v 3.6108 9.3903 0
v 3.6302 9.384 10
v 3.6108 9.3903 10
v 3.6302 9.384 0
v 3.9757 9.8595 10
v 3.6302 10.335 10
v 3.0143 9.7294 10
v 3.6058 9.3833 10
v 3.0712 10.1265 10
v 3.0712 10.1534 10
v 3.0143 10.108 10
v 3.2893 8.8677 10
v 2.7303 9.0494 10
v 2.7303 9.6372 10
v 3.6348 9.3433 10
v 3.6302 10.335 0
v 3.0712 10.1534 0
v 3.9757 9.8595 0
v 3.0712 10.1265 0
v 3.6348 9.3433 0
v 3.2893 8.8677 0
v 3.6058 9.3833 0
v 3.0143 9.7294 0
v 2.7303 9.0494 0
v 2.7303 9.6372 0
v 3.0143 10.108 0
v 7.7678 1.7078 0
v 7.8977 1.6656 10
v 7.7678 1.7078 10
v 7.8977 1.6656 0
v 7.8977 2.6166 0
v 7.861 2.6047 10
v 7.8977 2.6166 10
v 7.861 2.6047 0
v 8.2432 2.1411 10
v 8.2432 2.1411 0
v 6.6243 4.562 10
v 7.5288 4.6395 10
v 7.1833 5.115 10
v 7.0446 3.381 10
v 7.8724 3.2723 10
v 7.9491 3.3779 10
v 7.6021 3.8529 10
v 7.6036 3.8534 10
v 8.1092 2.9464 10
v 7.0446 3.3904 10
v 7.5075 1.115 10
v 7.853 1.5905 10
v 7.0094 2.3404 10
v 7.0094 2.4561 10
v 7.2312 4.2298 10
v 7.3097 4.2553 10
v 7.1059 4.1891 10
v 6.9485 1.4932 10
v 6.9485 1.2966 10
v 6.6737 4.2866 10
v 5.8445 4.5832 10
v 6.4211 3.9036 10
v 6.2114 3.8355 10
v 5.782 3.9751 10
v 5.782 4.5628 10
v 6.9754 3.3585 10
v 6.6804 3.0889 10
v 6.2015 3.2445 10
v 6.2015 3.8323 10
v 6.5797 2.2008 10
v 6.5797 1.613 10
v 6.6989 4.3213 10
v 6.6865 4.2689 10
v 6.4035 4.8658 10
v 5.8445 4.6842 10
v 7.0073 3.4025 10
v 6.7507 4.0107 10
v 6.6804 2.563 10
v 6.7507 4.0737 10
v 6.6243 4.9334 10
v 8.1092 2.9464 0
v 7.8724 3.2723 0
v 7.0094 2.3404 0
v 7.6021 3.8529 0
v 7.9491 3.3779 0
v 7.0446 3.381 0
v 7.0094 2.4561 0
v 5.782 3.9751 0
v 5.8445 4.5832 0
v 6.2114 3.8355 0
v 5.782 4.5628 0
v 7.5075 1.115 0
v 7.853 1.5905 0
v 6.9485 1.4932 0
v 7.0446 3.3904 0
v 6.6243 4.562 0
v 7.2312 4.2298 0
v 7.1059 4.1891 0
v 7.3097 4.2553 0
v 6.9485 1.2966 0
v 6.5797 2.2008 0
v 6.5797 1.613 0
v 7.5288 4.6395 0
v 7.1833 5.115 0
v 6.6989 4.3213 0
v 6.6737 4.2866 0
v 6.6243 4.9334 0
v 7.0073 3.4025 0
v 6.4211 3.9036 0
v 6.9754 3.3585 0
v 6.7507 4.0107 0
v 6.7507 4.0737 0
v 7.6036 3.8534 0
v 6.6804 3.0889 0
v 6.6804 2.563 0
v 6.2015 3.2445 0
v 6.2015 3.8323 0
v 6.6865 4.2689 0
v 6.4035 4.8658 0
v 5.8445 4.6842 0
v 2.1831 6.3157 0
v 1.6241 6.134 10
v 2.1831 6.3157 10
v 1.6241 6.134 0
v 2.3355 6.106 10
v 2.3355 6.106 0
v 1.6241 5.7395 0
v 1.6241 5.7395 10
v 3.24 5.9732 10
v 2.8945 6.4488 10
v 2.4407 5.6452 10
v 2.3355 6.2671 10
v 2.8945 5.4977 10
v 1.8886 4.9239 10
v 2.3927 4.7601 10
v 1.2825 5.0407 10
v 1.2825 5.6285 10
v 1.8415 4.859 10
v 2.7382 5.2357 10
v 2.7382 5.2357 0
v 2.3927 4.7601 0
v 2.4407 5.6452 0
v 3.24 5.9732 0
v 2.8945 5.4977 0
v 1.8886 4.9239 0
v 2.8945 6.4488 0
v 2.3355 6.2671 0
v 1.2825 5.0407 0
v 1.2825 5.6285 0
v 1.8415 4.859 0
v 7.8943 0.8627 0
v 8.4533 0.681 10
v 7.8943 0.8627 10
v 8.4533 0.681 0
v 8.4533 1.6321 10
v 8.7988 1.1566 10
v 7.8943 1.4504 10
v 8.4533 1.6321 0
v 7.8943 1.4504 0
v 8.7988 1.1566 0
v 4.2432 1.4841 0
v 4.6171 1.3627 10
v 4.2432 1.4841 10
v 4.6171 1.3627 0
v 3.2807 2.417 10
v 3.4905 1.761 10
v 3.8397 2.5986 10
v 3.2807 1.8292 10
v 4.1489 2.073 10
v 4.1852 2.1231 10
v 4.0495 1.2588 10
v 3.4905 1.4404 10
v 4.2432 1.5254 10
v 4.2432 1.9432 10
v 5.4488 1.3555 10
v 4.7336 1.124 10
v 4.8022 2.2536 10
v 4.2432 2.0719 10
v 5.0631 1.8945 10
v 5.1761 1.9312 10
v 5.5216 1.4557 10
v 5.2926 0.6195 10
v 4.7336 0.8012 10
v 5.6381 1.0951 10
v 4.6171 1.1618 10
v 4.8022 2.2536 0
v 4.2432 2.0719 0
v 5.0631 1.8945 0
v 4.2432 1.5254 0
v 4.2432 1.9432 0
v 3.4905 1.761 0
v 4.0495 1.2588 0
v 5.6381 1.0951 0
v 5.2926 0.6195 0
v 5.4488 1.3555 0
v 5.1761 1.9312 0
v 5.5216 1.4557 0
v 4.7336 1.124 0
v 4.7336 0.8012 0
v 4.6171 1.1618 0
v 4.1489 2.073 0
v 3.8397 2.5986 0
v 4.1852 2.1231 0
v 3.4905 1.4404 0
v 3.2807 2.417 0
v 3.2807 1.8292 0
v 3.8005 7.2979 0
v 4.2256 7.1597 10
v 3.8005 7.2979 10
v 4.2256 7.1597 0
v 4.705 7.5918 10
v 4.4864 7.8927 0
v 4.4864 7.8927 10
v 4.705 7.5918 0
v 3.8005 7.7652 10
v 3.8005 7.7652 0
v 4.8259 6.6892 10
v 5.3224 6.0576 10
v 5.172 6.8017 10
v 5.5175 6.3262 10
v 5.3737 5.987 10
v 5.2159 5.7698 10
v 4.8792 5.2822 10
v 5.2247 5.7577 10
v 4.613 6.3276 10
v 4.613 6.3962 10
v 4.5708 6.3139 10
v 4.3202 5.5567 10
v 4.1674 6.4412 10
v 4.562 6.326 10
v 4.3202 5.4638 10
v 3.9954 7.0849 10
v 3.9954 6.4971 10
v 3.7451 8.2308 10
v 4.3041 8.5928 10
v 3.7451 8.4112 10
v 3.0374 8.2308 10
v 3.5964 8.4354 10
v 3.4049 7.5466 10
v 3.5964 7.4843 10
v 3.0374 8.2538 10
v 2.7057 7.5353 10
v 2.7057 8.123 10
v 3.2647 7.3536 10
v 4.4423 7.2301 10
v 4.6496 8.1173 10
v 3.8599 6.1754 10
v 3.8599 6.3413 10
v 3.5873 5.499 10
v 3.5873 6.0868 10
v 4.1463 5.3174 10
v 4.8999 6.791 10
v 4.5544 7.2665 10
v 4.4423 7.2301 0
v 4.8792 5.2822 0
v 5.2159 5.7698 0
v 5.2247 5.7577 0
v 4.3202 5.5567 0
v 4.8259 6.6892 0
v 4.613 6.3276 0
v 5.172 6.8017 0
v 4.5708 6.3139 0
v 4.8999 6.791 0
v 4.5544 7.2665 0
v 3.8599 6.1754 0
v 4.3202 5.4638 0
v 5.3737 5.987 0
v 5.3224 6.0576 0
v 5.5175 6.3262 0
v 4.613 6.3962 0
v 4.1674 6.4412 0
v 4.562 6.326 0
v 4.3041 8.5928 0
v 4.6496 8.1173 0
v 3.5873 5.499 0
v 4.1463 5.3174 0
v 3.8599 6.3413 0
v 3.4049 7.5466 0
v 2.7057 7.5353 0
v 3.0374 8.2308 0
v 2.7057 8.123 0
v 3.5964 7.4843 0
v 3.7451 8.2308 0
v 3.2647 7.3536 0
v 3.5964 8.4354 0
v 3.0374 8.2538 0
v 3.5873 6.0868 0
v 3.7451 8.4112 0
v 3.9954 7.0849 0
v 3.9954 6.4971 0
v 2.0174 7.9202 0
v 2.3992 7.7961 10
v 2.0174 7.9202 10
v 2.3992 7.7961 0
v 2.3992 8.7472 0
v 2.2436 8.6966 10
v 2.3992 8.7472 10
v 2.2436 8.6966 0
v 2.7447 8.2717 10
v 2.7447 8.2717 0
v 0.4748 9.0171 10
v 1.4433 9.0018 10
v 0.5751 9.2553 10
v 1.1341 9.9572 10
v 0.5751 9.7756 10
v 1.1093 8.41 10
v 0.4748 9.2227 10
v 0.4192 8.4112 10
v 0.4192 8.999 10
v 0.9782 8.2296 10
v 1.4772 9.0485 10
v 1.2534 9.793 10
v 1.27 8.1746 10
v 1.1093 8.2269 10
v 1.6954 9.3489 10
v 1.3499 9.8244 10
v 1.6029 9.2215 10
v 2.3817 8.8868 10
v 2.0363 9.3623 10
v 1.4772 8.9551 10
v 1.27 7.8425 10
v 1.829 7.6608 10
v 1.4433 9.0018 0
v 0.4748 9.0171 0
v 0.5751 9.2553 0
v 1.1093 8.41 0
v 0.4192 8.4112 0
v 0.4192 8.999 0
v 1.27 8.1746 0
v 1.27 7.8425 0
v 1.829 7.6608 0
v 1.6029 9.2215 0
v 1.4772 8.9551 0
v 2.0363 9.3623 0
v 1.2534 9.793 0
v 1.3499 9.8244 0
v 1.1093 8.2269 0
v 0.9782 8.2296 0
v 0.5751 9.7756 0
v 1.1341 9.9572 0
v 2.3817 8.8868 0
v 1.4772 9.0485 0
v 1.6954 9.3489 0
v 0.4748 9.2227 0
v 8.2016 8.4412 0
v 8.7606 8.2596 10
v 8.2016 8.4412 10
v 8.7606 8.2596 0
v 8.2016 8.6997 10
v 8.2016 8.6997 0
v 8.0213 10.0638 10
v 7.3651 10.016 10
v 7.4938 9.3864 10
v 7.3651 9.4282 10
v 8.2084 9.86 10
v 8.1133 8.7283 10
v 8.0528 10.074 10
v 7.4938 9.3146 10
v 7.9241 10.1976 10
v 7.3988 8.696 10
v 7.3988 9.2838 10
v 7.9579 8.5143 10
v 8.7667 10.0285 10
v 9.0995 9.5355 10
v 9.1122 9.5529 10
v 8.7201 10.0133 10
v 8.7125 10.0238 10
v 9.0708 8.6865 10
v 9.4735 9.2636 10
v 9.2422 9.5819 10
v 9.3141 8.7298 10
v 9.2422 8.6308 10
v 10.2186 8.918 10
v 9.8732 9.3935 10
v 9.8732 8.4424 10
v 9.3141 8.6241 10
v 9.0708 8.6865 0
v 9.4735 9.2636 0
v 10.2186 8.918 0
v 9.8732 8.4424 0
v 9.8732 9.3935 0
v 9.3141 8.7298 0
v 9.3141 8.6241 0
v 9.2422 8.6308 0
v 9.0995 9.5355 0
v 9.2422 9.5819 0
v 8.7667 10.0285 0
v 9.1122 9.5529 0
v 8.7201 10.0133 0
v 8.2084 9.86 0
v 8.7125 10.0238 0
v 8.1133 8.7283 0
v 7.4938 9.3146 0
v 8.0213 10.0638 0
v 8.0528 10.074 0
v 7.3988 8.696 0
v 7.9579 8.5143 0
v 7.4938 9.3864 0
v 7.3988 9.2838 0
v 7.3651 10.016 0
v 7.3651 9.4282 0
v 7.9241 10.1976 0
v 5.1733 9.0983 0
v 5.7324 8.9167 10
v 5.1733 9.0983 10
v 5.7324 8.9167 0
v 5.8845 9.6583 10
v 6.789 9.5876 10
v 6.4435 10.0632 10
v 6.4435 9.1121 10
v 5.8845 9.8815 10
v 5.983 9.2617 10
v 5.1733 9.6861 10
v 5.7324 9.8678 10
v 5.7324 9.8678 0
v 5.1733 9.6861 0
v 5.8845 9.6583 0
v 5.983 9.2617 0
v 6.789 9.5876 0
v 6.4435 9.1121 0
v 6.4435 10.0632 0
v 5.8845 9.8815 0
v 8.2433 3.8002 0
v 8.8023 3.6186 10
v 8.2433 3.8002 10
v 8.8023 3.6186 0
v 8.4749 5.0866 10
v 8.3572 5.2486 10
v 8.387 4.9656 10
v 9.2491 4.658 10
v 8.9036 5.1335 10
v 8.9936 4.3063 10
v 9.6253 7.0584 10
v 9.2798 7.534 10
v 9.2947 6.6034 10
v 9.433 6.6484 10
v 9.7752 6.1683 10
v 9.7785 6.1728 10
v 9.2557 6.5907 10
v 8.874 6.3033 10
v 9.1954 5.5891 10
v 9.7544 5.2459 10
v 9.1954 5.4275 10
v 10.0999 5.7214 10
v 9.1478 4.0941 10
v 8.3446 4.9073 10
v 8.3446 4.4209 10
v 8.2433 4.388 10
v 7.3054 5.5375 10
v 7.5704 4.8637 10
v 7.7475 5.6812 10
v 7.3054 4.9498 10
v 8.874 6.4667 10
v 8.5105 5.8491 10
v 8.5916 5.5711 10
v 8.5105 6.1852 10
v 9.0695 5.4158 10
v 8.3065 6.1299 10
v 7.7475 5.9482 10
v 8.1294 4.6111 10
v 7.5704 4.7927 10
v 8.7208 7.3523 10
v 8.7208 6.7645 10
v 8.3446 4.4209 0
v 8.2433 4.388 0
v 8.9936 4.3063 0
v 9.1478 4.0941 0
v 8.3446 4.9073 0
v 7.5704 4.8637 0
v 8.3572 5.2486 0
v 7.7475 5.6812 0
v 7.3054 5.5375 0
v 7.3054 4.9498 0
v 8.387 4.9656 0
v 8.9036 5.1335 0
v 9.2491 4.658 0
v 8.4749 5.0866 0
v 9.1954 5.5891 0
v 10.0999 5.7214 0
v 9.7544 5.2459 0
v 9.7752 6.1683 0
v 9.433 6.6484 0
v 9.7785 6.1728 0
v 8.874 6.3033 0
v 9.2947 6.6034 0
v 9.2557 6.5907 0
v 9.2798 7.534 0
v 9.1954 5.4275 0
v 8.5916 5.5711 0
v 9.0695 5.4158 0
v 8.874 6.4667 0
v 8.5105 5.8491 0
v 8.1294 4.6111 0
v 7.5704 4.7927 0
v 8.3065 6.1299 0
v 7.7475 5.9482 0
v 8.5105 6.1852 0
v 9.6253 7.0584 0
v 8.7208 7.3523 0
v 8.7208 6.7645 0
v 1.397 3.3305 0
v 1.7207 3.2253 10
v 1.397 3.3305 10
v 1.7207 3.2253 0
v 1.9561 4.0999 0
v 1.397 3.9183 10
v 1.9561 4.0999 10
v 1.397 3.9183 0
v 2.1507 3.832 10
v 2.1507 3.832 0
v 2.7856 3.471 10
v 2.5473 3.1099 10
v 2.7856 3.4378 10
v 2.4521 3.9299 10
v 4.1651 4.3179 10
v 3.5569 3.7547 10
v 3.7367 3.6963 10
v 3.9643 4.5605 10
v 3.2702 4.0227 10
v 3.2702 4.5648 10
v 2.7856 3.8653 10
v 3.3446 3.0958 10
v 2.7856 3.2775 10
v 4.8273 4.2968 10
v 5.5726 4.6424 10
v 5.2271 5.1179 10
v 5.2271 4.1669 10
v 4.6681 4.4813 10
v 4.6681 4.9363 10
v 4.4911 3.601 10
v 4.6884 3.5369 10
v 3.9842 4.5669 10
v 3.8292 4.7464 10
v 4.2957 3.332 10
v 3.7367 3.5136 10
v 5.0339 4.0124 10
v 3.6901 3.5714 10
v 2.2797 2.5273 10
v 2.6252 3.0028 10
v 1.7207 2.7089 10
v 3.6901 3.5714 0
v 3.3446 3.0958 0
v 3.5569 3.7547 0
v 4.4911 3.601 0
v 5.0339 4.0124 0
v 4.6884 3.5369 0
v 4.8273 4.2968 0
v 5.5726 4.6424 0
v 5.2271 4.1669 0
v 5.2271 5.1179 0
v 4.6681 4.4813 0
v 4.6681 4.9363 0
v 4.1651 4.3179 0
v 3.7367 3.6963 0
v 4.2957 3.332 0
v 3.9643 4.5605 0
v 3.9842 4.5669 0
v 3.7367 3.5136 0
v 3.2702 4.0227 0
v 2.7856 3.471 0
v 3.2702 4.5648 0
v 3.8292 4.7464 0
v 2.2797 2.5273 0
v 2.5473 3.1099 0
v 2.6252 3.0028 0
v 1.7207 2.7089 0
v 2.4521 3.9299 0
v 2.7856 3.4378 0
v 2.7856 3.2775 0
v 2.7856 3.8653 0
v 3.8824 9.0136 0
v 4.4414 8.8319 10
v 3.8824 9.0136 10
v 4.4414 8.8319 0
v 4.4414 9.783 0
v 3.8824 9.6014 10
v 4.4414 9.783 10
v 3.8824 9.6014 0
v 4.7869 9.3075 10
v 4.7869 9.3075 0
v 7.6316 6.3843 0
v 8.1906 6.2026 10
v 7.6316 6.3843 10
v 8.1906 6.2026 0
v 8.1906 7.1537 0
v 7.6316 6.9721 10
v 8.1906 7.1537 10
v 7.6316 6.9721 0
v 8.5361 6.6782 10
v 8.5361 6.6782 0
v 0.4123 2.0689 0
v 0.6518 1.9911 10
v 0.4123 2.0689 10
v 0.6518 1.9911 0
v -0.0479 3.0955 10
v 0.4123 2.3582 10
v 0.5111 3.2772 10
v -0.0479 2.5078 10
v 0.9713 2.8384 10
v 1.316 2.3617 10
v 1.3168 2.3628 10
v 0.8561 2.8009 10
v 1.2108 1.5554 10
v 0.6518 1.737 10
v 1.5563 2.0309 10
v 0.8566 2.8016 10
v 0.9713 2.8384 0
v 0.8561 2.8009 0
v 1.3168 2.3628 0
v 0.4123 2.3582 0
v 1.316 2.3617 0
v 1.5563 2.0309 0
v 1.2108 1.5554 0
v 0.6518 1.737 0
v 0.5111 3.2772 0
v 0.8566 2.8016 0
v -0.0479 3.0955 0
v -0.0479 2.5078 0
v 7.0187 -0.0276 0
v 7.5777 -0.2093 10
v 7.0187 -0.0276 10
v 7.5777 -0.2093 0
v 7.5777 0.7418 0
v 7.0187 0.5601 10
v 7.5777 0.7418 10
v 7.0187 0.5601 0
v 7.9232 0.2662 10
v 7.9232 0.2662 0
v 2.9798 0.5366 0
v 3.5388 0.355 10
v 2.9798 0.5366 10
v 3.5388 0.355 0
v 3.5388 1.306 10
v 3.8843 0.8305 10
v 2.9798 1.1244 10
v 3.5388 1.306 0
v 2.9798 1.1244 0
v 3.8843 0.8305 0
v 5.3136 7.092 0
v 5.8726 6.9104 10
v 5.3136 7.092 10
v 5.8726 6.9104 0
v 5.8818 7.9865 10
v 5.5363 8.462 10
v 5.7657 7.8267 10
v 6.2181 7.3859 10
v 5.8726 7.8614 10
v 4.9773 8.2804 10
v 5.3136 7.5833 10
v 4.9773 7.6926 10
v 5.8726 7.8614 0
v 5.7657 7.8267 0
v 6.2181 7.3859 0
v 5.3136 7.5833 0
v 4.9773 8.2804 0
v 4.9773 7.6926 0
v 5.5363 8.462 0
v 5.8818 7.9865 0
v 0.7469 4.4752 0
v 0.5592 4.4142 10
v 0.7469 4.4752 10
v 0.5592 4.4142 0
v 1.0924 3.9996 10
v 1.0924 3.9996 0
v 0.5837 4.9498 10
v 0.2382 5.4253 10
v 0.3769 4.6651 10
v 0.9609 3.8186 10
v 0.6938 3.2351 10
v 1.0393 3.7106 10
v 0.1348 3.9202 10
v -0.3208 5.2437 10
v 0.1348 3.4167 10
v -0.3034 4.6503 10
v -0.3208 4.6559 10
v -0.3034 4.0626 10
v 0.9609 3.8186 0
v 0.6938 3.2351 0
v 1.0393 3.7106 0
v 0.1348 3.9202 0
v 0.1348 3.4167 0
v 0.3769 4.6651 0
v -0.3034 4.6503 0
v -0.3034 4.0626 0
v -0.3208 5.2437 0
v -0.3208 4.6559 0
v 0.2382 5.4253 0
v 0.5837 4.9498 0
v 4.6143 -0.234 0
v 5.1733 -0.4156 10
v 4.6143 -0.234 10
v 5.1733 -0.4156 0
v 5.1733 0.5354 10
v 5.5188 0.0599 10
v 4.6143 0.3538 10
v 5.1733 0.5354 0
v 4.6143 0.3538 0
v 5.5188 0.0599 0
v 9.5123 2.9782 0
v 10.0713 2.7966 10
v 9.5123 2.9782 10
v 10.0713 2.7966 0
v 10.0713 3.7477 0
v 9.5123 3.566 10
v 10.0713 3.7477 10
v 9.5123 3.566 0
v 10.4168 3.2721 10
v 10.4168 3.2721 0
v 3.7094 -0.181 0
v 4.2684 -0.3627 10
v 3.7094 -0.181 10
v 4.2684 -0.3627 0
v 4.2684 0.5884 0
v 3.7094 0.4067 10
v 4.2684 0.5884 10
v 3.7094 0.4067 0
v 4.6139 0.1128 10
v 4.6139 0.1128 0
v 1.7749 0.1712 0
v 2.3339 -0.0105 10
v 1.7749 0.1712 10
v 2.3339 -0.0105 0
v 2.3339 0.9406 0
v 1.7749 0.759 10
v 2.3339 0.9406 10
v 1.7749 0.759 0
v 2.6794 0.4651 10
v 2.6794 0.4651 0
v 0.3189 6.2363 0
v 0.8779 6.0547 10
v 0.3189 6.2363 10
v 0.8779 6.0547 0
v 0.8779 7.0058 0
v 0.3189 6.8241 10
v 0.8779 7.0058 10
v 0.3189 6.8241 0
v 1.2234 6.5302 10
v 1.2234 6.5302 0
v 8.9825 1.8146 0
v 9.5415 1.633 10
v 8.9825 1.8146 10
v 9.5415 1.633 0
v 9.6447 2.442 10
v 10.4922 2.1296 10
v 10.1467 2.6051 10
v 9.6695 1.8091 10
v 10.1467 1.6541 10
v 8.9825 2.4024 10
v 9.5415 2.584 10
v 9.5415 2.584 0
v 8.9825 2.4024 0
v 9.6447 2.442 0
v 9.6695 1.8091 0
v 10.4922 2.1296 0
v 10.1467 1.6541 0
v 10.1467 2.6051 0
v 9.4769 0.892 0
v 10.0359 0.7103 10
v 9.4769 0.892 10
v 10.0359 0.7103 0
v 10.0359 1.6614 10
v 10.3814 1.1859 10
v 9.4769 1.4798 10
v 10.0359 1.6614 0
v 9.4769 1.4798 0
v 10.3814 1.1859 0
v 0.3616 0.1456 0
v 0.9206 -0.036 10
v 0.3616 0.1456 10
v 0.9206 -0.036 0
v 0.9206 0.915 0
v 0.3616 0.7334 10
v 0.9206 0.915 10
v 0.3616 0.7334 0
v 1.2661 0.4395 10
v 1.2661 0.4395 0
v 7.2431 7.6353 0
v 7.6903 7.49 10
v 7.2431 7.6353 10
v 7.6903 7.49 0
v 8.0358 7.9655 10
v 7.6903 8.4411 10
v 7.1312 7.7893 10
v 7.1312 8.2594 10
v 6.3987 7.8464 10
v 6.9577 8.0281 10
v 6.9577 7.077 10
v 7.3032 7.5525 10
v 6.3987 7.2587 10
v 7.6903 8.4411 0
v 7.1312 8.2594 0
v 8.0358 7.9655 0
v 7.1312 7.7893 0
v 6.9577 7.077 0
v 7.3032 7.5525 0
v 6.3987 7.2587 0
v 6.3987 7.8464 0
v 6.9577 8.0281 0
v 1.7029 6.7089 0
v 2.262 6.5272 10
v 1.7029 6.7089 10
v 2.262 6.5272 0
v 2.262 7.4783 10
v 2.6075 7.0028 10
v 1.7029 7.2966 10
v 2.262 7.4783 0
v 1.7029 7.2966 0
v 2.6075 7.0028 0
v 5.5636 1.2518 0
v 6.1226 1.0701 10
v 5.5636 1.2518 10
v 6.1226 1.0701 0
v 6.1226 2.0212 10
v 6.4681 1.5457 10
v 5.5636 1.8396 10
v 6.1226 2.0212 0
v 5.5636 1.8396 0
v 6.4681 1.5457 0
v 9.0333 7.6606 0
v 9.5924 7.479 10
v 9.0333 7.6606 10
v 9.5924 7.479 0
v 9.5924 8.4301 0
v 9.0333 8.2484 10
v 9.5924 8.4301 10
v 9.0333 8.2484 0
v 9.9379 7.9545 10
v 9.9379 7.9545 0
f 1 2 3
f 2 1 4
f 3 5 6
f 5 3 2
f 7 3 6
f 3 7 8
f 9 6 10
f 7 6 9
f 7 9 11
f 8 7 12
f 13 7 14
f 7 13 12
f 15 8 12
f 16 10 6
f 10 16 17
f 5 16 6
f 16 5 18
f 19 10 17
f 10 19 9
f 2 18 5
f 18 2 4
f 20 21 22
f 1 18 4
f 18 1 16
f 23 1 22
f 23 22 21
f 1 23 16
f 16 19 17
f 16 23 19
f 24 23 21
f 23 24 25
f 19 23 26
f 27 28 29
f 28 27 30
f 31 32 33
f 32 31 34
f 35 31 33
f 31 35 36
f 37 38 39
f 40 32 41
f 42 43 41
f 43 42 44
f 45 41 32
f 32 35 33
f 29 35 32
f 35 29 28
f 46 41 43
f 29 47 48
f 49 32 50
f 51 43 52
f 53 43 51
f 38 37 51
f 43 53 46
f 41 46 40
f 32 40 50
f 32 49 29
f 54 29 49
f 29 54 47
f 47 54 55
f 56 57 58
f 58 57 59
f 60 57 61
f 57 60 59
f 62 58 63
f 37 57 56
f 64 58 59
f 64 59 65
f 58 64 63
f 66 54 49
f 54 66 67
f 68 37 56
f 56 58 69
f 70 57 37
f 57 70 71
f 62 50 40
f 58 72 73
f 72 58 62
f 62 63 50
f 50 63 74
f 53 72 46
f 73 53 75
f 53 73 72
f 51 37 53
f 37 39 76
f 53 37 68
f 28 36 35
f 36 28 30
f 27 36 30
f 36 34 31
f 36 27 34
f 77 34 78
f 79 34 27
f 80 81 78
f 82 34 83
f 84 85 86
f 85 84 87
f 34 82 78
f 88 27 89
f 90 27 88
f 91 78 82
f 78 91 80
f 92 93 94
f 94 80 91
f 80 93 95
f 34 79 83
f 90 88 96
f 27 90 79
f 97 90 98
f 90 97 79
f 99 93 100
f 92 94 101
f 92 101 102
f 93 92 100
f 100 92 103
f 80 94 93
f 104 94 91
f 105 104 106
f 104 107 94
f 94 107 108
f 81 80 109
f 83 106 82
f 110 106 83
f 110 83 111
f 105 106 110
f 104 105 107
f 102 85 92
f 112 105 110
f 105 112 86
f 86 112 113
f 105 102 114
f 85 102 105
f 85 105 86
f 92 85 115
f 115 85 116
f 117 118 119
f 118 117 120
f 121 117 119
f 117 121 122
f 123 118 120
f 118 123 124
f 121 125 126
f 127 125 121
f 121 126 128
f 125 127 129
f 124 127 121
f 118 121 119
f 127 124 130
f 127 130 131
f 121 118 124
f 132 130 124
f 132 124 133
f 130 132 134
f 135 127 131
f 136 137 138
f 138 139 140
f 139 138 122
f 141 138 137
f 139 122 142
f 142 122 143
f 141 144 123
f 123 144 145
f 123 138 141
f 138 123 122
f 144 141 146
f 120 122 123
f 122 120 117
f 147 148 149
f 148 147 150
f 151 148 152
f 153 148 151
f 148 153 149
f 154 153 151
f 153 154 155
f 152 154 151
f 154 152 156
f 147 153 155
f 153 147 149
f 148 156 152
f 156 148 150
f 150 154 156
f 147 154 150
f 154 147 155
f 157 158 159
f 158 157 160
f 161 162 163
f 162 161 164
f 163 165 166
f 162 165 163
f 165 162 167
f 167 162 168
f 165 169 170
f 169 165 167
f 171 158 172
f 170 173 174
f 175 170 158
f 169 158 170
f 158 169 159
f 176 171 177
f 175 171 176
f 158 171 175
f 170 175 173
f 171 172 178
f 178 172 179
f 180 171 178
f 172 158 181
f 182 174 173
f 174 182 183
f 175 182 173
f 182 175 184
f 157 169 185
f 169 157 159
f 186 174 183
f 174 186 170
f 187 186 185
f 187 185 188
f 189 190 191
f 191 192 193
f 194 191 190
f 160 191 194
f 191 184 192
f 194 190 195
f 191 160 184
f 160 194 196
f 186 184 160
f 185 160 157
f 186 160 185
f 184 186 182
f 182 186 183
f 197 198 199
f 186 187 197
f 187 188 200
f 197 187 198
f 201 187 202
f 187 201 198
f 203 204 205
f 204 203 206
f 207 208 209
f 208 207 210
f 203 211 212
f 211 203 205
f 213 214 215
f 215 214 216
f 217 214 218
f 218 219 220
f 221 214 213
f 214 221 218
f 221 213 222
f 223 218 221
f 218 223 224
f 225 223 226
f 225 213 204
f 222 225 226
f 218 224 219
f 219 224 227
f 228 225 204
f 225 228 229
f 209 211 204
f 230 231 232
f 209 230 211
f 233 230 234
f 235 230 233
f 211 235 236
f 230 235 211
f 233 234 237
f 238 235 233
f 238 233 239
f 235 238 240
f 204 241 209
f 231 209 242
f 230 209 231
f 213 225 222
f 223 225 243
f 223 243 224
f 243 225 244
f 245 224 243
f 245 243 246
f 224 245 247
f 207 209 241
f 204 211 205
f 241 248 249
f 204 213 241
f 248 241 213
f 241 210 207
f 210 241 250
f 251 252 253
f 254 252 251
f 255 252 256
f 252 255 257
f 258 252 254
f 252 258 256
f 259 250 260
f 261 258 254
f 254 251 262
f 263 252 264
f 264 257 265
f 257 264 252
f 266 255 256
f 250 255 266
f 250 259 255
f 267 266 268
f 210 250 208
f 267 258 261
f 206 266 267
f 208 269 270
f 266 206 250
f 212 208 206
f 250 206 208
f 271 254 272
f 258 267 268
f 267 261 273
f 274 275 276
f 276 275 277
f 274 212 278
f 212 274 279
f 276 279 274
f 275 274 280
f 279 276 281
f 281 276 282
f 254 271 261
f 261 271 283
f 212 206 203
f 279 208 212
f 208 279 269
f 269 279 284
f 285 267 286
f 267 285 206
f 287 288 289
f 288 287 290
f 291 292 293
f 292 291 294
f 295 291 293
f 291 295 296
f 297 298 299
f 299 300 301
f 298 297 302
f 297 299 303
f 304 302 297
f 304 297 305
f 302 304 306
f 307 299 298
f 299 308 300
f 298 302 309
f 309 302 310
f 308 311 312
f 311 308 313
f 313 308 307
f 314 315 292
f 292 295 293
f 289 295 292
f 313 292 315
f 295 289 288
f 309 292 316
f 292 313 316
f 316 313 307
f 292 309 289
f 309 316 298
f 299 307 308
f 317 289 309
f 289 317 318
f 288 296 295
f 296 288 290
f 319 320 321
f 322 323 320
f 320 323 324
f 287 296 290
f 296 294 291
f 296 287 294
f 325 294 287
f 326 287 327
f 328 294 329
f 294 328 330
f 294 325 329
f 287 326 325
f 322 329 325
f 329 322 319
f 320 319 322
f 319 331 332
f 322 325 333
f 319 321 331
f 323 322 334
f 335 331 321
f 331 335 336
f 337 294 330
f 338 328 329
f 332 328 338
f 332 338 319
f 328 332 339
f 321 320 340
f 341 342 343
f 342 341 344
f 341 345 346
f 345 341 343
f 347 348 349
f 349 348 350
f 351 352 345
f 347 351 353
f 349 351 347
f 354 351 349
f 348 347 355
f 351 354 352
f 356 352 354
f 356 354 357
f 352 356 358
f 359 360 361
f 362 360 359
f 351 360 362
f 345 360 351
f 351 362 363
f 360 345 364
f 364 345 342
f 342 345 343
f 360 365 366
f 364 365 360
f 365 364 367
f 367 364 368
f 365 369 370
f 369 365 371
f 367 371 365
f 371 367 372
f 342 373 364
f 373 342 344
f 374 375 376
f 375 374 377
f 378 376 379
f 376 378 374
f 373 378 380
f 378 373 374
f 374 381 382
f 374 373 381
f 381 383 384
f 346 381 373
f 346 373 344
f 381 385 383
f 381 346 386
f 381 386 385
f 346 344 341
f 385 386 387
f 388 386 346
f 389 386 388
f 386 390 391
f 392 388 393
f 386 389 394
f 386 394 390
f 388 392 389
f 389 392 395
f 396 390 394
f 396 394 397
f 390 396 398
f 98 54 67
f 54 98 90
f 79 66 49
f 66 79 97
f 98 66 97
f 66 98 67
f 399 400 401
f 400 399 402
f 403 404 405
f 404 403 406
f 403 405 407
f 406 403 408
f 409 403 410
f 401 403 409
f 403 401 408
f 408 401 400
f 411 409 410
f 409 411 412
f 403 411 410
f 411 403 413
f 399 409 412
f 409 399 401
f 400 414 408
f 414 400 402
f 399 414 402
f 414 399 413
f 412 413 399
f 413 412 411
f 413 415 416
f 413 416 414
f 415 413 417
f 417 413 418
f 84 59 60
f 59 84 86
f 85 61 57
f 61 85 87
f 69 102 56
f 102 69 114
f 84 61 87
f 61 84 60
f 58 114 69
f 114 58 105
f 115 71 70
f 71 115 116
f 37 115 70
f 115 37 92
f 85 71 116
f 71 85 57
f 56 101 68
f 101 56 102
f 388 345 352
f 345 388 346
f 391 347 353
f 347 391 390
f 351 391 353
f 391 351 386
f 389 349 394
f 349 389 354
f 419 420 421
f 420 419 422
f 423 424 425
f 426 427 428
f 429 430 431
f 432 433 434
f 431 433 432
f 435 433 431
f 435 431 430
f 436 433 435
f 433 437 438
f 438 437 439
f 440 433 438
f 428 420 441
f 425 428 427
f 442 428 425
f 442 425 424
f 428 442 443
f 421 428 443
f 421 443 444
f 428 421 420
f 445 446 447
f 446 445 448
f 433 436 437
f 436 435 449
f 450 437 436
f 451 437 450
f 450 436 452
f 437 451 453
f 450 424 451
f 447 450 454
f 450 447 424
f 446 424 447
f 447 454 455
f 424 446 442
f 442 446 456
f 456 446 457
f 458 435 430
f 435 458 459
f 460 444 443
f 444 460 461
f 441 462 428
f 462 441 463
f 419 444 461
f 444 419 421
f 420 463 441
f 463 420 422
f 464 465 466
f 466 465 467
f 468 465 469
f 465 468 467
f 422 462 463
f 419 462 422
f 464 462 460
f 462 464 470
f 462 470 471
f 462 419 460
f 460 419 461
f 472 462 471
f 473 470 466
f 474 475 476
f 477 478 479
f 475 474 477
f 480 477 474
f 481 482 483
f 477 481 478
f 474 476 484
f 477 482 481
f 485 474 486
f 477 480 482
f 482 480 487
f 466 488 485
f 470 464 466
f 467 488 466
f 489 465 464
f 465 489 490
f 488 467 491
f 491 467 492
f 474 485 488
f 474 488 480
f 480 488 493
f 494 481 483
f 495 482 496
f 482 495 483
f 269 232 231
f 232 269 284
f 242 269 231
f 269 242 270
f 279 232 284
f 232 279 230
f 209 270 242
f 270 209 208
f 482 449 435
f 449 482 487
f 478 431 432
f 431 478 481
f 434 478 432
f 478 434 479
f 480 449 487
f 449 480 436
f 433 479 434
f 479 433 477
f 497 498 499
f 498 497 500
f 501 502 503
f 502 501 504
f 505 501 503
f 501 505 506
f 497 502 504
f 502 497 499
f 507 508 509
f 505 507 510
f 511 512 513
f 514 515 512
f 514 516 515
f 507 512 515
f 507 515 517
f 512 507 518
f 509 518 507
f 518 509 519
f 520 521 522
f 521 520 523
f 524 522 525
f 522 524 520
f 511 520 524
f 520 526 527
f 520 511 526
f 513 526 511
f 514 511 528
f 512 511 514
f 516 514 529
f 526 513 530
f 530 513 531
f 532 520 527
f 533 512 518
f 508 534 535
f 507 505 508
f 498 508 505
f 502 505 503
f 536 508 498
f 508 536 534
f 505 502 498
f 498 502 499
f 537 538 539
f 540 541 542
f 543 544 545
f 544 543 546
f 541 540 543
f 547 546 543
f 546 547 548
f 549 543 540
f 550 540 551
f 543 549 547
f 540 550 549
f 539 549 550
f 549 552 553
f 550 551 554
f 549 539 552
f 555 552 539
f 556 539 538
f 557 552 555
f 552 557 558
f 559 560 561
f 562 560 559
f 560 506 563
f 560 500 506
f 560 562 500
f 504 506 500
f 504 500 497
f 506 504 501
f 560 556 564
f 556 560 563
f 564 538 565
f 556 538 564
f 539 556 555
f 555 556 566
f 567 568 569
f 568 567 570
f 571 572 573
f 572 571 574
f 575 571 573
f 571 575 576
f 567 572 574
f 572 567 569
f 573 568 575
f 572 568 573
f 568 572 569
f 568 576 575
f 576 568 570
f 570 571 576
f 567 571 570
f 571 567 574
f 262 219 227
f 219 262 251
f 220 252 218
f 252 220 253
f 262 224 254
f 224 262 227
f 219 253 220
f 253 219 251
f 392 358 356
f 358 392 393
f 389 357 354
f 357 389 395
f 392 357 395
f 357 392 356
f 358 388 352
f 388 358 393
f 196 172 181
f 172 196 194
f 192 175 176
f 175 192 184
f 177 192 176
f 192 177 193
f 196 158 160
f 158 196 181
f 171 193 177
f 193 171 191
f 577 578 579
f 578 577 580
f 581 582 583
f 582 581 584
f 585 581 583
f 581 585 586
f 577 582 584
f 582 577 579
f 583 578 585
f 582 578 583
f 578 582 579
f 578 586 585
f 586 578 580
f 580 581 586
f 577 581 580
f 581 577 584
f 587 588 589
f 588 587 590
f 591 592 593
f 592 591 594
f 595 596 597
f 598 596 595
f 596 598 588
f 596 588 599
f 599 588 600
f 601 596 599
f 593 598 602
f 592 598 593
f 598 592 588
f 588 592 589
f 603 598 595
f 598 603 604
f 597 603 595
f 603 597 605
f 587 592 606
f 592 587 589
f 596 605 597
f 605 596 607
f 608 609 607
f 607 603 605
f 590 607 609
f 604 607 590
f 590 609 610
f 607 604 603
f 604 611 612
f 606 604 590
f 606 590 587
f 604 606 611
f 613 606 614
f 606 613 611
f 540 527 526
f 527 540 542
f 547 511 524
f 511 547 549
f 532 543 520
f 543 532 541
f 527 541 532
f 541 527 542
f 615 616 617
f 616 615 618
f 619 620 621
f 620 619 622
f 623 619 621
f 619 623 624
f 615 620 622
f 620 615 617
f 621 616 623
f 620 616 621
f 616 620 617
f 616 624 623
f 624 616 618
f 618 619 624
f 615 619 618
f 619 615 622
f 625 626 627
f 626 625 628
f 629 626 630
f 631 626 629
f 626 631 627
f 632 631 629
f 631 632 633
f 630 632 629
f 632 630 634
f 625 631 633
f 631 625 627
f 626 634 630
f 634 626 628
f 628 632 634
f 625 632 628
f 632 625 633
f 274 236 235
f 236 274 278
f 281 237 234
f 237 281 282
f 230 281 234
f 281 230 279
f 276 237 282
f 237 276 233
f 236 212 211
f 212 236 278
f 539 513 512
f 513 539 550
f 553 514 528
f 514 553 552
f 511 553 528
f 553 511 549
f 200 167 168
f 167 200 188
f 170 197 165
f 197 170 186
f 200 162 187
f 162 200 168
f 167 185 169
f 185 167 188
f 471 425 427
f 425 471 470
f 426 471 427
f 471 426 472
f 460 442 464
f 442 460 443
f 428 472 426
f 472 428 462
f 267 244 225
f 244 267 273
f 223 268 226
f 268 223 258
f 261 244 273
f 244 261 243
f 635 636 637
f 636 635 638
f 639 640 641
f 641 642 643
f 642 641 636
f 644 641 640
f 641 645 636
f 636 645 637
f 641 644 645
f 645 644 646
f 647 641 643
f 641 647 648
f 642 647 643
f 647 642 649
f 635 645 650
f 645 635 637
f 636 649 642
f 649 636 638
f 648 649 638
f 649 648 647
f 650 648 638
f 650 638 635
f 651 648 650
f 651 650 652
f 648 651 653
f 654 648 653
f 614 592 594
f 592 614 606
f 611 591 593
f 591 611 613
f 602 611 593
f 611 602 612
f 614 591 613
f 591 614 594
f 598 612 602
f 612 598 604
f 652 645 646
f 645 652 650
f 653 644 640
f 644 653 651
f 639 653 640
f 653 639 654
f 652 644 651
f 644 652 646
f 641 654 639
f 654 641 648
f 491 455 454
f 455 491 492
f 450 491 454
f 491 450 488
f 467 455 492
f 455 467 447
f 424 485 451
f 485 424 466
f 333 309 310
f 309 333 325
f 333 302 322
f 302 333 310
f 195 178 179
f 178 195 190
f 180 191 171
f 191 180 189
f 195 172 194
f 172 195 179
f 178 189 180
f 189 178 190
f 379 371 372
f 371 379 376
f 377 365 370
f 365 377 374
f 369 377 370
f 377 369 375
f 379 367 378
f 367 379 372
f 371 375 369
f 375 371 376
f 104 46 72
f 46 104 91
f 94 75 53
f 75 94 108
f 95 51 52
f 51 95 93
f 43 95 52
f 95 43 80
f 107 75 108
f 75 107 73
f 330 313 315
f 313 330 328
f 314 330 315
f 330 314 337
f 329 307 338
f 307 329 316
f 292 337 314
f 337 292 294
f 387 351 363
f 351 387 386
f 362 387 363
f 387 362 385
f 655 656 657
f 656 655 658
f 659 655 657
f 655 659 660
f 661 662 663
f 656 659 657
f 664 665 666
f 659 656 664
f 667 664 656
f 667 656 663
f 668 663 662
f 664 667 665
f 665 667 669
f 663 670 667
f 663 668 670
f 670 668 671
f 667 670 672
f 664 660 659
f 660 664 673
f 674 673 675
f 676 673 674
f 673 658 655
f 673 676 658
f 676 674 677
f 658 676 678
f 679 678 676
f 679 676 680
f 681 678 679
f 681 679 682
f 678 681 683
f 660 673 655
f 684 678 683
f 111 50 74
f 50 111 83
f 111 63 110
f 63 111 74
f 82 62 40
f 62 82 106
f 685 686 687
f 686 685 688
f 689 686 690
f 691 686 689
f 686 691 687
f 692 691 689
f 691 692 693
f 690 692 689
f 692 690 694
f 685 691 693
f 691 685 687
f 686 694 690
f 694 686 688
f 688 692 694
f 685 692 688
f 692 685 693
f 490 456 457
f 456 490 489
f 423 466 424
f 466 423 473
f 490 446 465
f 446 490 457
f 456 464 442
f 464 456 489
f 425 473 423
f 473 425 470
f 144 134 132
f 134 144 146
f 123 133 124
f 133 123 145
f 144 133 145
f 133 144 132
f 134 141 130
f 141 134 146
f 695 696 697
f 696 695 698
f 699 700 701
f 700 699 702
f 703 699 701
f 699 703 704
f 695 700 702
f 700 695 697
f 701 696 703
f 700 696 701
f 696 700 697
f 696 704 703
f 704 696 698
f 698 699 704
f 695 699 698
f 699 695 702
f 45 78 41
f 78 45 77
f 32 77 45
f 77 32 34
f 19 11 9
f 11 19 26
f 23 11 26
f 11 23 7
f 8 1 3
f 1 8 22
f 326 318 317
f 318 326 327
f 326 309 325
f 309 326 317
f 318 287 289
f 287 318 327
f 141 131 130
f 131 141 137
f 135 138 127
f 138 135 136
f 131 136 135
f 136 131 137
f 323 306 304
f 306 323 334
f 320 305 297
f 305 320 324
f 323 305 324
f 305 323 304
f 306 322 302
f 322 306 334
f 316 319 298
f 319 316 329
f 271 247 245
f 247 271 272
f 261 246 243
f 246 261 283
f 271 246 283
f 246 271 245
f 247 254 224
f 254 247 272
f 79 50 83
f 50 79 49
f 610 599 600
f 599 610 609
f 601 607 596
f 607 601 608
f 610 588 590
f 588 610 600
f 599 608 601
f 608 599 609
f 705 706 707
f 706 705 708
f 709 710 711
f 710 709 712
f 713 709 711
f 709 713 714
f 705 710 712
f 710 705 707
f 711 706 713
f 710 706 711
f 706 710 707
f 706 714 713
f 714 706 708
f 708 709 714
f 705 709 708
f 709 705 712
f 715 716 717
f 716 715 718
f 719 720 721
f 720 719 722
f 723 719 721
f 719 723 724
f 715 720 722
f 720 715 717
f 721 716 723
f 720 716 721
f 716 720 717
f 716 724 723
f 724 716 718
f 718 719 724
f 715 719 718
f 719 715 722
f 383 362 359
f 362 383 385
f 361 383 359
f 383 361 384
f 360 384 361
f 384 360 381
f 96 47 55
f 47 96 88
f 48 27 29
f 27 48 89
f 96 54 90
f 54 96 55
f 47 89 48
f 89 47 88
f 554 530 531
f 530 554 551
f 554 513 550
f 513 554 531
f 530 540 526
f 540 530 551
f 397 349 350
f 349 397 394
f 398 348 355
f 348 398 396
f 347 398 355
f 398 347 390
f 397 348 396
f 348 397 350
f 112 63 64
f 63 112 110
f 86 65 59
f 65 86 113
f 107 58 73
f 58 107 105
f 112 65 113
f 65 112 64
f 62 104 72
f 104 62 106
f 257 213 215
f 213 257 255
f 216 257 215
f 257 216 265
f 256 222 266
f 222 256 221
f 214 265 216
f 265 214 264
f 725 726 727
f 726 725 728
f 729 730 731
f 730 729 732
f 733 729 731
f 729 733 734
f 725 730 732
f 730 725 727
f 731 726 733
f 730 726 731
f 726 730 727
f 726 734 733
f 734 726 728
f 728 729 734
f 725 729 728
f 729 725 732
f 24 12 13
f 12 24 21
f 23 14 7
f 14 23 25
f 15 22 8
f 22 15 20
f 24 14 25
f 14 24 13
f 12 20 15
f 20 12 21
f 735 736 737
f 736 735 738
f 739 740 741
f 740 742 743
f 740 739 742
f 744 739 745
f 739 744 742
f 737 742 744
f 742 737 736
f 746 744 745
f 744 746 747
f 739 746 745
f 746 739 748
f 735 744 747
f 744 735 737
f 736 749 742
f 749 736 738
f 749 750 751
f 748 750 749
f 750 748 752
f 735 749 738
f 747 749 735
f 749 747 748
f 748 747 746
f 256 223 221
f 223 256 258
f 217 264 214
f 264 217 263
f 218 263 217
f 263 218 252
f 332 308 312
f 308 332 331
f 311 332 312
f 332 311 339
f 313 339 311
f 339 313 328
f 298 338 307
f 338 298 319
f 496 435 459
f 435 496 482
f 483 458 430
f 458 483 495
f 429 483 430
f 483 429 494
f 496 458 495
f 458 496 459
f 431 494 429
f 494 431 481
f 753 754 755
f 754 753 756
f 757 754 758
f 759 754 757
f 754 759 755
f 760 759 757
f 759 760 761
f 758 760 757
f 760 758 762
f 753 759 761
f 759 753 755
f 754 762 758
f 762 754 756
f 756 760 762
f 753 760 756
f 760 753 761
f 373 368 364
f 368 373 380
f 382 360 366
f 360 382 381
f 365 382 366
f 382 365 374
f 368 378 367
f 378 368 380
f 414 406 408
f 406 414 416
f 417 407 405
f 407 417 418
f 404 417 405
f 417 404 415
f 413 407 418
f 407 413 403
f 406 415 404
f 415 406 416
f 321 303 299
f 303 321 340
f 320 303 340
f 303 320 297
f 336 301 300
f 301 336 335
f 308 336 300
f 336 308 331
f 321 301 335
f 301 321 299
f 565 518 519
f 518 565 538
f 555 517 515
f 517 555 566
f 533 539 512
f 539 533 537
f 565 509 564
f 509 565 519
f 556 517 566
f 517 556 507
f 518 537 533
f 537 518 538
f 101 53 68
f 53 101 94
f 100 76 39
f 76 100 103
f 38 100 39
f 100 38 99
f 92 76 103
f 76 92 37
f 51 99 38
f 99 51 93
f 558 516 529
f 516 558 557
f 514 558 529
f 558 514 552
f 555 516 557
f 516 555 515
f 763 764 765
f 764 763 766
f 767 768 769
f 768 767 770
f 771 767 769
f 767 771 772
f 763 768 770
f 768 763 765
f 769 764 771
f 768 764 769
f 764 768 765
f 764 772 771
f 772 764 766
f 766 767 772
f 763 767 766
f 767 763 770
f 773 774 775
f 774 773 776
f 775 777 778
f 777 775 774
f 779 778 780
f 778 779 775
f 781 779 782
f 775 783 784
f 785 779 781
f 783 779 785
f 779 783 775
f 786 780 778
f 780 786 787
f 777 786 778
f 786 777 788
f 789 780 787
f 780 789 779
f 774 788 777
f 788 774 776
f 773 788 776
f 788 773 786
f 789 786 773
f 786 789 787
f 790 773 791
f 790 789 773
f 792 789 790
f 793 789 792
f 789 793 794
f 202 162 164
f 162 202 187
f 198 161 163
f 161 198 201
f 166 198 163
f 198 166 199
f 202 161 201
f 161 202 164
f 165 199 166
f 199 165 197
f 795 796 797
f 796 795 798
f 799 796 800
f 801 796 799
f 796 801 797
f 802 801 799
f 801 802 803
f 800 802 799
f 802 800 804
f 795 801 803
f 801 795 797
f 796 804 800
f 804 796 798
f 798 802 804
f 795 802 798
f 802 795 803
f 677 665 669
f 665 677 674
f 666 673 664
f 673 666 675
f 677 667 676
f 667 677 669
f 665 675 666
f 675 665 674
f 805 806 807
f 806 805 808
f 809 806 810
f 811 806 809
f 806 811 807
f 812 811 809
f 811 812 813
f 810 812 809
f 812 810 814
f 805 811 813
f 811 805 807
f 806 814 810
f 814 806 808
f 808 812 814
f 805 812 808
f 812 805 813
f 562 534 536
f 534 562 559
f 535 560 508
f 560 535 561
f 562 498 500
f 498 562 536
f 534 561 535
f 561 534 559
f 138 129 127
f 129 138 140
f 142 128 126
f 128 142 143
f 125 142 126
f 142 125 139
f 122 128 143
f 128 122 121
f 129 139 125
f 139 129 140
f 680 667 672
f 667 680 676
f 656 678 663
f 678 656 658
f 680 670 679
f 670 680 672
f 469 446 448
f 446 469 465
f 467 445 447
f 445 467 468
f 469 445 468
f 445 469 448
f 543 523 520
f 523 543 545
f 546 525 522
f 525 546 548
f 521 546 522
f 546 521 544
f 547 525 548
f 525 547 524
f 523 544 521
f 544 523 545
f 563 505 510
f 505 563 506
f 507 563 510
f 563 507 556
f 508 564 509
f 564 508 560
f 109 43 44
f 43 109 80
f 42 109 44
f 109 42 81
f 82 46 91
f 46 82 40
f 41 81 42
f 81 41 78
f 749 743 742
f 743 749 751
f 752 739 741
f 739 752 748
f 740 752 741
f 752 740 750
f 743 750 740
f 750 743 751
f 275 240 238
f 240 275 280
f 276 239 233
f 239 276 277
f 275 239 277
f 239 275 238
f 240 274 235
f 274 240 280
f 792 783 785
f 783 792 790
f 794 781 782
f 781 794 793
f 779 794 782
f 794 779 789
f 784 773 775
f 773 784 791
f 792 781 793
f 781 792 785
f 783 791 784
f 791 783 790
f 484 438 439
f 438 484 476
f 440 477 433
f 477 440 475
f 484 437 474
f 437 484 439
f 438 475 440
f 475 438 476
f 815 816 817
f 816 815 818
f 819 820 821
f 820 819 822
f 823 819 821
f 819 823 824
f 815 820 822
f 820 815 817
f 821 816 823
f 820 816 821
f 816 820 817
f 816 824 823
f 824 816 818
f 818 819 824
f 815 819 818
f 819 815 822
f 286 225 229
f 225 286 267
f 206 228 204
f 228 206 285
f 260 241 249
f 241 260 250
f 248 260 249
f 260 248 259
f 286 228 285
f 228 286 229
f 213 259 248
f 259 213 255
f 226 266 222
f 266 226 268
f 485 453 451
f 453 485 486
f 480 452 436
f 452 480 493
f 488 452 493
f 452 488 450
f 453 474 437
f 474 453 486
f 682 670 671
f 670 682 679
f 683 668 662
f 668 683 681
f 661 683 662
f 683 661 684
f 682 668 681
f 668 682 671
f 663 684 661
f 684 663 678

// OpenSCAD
// Some random pins, with help from https://en.wikibooks.org/wiki/OpenSCAD_User_Manual/Mathematical_Functions

for(i=[0:100]){
    translate([rands(0,10,1)[0], rands(0,10,1)[0], 0]) cylinder(d=1, h=10);
    }
